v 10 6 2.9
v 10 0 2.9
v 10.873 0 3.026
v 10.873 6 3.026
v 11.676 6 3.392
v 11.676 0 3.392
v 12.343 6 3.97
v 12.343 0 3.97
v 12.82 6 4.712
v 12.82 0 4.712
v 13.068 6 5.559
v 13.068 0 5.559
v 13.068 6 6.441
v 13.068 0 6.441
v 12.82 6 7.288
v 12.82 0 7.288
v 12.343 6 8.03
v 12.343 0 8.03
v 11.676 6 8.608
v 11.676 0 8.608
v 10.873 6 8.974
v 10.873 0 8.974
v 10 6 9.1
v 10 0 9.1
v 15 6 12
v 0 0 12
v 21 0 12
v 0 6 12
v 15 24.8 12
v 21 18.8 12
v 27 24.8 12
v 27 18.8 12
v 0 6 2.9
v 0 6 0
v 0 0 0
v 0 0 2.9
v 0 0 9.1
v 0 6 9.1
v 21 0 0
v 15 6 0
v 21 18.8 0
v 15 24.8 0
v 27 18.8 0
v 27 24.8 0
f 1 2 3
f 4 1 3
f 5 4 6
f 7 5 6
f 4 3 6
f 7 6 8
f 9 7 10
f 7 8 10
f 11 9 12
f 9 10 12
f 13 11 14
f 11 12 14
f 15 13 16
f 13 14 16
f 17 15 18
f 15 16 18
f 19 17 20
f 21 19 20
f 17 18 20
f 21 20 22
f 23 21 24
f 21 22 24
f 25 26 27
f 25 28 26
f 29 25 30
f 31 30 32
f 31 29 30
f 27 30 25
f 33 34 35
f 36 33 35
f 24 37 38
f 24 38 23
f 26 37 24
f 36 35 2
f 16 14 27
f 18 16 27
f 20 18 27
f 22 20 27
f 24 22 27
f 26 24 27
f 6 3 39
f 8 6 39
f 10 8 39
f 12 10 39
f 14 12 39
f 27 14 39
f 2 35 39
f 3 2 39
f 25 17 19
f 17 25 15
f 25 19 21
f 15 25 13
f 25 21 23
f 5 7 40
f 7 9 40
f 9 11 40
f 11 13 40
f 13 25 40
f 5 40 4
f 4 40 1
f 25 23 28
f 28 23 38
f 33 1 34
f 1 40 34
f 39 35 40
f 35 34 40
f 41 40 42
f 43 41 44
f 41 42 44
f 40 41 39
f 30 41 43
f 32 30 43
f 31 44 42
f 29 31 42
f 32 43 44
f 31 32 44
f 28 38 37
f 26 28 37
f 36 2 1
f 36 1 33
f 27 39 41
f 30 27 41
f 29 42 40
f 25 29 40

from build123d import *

# Parameters (mm, degrees)
PAD_DEPTH    = 12
POCKET_DEPTH = 6


with BuildPart() as part:
    # Sketch → Pad (new body)
    with BuildSketch(Plane.XY):
        Polygon((0, 0), (21, 0), (21, 18.8), (27, 18.8), (27, 24.8), (15, 24.8), (15, 6), (0, 6), align=None)
    extrude(amount=PAD_DEPTH)

    # Sketch002 (on Face1 of Pad) → Pocket (cut)
    with BuildSketch(Plane.XZ):
        with BuildLine():
            Line((0, 9.1), (10, 9.1))
            ThreePointArc((10, 2.9), (13.1, 6), (10, 9.1))
            Line((10, 2.9), (0, 2.9))
            ThreePointArc((0, 9.1), (-3.1, 6), (0, 2.9))
        make_face()
    extrude(amount=-POCKET_DEPTH, mode=Mode.SUBTRACT)


solid = part.part
